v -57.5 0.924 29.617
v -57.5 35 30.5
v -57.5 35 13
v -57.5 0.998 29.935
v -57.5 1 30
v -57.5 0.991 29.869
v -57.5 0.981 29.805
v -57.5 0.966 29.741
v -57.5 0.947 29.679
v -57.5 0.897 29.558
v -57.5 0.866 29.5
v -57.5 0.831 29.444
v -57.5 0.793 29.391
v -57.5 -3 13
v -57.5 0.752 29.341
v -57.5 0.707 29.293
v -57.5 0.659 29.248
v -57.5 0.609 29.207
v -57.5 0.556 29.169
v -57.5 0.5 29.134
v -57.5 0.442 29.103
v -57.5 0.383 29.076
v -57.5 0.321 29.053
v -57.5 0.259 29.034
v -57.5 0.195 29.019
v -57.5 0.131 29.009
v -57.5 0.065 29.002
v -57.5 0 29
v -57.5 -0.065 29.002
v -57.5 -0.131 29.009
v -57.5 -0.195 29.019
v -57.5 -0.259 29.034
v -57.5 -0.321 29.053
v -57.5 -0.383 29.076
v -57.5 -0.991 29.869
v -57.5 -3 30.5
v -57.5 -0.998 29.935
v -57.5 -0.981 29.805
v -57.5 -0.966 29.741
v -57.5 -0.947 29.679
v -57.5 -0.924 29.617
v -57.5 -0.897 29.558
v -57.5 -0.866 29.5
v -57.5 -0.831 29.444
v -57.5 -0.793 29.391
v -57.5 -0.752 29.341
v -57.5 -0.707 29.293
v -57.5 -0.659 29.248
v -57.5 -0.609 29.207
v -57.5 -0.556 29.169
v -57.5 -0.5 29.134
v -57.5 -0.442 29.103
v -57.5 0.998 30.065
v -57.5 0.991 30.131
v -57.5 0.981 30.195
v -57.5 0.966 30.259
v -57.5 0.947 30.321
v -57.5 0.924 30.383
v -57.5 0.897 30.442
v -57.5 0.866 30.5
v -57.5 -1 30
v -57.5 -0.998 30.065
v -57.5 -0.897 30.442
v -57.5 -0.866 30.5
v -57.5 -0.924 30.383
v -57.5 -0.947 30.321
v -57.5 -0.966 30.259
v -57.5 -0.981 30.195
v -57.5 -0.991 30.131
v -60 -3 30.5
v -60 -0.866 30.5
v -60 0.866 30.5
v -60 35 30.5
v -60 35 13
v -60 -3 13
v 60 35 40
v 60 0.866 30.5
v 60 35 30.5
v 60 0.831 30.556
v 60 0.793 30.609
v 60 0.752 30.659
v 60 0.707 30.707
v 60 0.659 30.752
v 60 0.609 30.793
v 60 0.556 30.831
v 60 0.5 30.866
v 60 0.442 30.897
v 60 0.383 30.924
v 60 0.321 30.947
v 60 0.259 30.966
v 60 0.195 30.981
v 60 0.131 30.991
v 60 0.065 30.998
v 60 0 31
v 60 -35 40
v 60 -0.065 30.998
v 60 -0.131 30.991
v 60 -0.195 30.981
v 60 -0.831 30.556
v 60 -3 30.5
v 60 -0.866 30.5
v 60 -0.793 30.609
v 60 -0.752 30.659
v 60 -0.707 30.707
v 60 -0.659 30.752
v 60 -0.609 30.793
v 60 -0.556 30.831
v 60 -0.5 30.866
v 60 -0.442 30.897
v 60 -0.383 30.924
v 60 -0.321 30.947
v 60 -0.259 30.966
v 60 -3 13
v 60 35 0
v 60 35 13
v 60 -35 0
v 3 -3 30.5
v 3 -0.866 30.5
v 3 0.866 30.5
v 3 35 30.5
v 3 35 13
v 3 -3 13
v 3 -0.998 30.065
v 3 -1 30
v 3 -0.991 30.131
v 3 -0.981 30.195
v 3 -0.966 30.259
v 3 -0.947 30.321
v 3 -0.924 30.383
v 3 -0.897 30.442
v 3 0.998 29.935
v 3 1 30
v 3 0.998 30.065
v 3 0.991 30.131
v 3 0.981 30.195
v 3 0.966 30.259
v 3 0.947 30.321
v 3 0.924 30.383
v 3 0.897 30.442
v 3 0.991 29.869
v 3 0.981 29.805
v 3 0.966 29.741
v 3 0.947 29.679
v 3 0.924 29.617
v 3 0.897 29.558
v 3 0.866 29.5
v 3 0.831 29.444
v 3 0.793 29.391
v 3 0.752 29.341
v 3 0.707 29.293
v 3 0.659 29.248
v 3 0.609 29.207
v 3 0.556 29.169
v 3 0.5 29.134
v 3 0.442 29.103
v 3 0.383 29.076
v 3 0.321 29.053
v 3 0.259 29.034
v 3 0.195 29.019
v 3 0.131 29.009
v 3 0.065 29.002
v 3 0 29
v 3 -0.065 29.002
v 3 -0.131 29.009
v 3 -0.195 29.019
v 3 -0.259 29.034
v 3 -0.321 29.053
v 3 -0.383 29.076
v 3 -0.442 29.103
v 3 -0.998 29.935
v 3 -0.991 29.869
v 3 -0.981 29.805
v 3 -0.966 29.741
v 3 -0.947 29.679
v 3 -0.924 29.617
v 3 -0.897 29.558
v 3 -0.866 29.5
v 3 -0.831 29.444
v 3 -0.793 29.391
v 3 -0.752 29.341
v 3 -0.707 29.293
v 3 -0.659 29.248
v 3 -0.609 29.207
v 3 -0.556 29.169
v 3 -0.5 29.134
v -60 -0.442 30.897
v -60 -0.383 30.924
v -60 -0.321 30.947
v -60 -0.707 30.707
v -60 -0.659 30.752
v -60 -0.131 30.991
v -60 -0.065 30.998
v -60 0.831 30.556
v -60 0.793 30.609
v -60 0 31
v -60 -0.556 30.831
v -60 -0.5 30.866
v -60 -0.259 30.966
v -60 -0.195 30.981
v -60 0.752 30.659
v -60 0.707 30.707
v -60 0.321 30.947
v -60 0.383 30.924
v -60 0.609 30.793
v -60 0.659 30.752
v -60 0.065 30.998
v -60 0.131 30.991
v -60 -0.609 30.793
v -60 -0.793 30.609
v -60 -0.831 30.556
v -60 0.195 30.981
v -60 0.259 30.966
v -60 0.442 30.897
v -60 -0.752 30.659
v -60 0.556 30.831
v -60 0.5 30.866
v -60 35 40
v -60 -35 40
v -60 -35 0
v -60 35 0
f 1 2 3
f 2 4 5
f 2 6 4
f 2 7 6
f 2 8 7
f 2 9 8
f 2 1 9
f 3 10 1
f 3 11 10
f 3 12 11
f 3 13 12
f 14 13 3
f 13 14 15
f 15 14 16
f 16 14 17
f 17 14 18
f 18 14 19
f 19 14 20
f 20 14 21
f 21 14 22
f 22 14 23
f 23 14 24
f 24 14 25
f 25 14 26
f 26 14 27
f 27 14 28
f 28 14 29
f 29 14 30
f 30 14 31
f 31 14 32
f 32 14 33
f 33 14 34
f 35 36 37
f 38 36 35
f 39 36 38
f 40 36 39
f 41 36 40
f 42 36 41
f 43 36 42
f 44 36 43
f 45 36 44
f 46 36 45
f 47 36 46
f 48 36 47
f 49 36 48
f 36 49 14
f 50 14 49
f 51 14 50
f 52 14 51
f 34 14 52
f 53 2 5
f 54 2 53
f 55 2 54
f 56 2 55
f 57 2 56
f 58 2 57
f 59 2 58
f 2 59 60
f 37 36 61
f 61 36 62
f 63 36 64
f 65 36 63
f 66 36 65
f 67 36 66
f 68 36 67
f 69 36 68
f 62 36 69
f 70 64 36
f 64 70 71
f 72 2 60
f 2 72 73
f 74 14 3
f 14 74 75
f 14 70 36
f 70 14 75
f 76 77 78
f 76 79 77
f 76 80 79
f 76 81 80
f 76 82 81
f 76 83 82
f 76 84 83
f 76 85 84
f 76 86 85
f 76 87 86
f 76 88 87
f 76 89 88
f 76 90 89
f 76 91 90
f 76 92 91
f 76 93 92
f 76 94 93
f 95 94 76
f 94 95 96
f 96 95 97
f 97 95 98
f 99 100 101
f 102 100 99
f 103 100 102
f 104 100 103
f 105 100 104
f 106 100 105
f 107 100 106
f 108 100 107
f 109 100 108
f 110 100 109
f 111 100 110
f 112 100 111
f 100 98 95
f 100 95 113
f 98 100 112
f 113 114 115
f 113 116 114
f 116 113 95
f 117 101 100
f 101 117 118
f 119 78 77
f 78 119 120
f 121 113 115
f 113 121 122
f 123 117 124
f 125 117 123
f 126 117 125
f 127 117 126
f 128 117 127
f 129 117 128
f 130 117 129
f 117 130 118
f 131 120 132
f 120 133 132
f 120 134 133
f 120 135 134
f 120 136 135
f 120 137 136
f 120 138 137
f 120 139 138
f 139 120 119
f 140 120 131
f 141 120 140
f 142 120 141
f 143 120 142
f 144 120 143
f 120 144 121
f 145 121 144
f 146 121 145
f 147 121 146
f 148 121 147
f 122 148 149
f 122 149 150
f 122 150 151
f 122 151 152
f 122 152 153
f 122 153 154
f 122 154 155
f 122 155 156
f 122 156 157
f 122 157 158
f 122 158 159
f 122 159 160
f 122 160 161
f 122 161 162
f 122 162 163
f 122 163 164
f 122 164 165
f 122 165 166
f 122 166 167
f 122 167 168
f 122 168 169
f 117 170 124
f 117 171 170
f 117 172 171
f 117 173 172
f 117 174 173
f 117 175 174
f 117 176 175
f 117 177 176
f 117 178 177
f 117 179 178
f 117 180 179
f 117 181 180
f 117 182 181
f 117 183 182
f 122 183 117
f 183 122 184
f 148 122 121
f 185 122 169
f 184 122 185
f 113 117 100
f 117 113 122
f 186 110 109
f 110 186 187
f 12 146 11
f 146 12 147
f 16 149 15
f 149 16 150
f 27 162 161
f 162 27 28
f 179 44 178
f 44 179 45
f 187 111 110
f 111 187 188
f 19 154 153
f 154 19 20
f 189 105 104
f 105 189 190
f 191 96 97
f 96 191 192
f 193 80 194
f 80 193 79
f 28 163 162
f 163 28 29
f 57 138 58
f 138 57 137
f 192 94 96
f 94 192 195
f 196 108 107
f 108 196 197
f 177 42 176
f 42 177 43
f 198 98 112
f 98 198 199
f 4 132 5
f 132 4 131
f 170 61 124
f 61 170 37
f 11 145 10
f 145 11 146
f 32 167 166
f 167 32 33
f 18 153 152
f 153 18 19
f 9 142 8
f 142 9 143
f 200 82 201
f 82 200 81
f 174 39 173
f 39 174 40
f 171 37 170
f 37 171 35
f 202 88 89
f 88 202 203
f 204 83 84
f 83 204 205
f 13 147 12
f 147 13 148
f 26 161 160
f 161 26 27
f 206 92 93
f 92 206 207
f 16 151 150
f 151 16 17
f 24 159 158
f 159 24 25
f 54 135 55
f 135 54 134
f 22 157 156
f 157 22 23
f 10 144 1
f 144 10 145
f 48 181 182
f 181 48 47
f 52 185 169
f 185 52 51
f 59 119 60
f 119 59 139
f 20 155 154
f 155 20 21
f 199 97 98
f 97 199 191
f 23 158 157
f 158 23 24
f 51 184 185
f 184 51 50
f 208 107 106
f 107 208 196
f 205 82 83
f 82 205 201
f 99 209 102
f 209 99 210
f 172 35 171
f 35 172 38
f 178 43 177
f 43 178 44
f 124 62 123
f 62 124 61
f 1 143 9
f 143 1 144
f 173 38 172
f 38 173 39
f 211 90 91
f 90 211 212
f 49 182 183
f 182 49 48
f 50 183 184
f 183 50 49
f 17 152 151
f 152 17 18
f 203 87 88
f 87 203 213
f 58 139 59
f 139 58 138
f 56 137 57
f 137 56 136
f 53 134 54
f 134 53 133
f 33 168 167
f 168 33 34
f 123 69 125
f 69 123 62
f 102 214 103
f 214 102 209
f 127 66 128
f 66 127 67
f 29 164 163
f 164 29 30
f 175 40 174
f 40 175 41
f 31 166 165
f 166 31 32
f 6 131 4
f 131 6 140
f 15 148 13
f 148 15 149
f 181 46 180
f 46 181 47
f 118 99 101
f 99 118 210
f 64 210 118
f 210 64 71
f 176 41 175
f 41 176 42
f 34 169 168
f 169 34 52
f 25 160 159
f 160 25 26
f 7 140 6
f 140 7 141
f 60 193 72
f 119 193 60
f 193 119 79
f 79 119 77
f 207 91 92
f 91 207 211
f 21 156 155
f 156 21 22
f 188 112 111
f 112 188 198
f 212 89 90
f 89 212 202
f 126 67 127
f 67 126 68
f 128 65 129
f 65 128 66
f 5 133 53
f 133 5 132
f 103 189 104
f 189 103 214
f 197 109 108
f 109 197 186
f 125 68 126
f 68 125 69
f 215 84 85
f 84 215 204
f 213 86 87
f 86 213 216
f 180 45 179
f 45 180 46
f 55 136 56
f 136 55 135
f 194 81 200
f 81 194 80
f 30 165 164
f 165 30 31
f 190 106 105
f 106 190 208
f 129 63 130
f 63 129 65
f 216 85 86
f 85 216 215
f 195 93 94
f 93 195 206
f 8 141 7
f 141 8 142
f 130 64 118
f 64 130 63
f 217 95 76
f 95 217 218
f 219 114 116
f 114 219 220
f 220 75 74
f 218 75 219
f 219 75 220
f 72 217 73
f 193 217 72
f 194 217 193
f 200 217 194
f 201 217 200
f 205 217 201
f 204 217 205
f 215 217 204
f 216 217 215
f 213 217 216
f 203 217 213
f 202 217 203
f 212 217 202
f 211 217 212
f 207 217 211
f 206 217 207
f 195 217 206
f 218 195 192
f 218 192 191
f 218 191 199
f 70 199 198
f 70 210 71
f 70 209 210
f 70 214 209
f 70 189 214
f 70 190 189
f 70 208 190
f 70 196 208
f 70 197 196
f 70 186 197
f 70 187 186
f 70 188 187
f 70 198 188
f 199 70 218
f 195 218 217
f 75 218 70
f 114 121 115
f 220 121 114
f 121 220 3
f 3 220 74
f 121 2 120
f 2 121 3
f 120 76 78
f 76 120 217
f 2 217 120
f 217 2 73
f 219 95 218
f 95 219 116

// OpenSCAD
// Mini horizontal gel-electrophoresis box - buffer tank
// Print orientation: tank rests on XY plane at z = 0, builds upward (+Z)

// ---------------- Parameters ----------------
tank_x      = 120;   // outer length along X (mm)
tank_y      = 70;    // outer width along Y (mm)
tank_h      = 40;    // outer height along Z (mm)
wall        = 3;     // wall thickness (mm)
floor       = 3;     // floor thickness (mm)

platform_x  = 60;    // platform length along X (mm), centred
platform_y  = tank_y - 2 * wall;  // platform spans full inner width (mm)
platform_top = 13;   // platform top height above inner floor (mm) -> z = floor + platform_top

hole_d      = 2;     // electrode hole diameter (mm)
hole_y      = 0;     // electrode hole Y position (mm)
hole_z      = 30;    // electrode hole Z position (mm)

eps         = 0.5;   // cutter overshoot past faces (mm)
$fn         = 96;    // curve resolution

// Derived
inner_floor_z = floor;
platform_z0   = inner_floor_z + platform_top - wall;  // platform bottom (above floor)
chamber_h     = hole_z - platform_z0;                 // chamber height where water connects

// ---------------- Model ----------------
difference() {
    // Tank body: open top, solid floor and walls
    translate([-tank_x/2, -tank_y/2, 0])
        cube([tank_x, tank_y, tank_h]);

    // Cut out the two buffer chambers above the central platform
    for (sx = [-1, 1])
        translate([sx > 0 ? wall : -tank_x/2 - eps, -wall, platform_z0])
            cube([sx > 0 ? tank_x/2 - wall : wall, tank_y + 2*wall, chamber_h + eps]);

    // Horizontal electrode holes through each end wall, along X
    for (sx = [-1, 1])
        translate([sx * (tank_x/2 - wall/2), hole_y, hole_z])
            rotate([0, 90, 0])
                cylinder(d = hole_d, h = tank_x + 2*eps, center = true);
}
